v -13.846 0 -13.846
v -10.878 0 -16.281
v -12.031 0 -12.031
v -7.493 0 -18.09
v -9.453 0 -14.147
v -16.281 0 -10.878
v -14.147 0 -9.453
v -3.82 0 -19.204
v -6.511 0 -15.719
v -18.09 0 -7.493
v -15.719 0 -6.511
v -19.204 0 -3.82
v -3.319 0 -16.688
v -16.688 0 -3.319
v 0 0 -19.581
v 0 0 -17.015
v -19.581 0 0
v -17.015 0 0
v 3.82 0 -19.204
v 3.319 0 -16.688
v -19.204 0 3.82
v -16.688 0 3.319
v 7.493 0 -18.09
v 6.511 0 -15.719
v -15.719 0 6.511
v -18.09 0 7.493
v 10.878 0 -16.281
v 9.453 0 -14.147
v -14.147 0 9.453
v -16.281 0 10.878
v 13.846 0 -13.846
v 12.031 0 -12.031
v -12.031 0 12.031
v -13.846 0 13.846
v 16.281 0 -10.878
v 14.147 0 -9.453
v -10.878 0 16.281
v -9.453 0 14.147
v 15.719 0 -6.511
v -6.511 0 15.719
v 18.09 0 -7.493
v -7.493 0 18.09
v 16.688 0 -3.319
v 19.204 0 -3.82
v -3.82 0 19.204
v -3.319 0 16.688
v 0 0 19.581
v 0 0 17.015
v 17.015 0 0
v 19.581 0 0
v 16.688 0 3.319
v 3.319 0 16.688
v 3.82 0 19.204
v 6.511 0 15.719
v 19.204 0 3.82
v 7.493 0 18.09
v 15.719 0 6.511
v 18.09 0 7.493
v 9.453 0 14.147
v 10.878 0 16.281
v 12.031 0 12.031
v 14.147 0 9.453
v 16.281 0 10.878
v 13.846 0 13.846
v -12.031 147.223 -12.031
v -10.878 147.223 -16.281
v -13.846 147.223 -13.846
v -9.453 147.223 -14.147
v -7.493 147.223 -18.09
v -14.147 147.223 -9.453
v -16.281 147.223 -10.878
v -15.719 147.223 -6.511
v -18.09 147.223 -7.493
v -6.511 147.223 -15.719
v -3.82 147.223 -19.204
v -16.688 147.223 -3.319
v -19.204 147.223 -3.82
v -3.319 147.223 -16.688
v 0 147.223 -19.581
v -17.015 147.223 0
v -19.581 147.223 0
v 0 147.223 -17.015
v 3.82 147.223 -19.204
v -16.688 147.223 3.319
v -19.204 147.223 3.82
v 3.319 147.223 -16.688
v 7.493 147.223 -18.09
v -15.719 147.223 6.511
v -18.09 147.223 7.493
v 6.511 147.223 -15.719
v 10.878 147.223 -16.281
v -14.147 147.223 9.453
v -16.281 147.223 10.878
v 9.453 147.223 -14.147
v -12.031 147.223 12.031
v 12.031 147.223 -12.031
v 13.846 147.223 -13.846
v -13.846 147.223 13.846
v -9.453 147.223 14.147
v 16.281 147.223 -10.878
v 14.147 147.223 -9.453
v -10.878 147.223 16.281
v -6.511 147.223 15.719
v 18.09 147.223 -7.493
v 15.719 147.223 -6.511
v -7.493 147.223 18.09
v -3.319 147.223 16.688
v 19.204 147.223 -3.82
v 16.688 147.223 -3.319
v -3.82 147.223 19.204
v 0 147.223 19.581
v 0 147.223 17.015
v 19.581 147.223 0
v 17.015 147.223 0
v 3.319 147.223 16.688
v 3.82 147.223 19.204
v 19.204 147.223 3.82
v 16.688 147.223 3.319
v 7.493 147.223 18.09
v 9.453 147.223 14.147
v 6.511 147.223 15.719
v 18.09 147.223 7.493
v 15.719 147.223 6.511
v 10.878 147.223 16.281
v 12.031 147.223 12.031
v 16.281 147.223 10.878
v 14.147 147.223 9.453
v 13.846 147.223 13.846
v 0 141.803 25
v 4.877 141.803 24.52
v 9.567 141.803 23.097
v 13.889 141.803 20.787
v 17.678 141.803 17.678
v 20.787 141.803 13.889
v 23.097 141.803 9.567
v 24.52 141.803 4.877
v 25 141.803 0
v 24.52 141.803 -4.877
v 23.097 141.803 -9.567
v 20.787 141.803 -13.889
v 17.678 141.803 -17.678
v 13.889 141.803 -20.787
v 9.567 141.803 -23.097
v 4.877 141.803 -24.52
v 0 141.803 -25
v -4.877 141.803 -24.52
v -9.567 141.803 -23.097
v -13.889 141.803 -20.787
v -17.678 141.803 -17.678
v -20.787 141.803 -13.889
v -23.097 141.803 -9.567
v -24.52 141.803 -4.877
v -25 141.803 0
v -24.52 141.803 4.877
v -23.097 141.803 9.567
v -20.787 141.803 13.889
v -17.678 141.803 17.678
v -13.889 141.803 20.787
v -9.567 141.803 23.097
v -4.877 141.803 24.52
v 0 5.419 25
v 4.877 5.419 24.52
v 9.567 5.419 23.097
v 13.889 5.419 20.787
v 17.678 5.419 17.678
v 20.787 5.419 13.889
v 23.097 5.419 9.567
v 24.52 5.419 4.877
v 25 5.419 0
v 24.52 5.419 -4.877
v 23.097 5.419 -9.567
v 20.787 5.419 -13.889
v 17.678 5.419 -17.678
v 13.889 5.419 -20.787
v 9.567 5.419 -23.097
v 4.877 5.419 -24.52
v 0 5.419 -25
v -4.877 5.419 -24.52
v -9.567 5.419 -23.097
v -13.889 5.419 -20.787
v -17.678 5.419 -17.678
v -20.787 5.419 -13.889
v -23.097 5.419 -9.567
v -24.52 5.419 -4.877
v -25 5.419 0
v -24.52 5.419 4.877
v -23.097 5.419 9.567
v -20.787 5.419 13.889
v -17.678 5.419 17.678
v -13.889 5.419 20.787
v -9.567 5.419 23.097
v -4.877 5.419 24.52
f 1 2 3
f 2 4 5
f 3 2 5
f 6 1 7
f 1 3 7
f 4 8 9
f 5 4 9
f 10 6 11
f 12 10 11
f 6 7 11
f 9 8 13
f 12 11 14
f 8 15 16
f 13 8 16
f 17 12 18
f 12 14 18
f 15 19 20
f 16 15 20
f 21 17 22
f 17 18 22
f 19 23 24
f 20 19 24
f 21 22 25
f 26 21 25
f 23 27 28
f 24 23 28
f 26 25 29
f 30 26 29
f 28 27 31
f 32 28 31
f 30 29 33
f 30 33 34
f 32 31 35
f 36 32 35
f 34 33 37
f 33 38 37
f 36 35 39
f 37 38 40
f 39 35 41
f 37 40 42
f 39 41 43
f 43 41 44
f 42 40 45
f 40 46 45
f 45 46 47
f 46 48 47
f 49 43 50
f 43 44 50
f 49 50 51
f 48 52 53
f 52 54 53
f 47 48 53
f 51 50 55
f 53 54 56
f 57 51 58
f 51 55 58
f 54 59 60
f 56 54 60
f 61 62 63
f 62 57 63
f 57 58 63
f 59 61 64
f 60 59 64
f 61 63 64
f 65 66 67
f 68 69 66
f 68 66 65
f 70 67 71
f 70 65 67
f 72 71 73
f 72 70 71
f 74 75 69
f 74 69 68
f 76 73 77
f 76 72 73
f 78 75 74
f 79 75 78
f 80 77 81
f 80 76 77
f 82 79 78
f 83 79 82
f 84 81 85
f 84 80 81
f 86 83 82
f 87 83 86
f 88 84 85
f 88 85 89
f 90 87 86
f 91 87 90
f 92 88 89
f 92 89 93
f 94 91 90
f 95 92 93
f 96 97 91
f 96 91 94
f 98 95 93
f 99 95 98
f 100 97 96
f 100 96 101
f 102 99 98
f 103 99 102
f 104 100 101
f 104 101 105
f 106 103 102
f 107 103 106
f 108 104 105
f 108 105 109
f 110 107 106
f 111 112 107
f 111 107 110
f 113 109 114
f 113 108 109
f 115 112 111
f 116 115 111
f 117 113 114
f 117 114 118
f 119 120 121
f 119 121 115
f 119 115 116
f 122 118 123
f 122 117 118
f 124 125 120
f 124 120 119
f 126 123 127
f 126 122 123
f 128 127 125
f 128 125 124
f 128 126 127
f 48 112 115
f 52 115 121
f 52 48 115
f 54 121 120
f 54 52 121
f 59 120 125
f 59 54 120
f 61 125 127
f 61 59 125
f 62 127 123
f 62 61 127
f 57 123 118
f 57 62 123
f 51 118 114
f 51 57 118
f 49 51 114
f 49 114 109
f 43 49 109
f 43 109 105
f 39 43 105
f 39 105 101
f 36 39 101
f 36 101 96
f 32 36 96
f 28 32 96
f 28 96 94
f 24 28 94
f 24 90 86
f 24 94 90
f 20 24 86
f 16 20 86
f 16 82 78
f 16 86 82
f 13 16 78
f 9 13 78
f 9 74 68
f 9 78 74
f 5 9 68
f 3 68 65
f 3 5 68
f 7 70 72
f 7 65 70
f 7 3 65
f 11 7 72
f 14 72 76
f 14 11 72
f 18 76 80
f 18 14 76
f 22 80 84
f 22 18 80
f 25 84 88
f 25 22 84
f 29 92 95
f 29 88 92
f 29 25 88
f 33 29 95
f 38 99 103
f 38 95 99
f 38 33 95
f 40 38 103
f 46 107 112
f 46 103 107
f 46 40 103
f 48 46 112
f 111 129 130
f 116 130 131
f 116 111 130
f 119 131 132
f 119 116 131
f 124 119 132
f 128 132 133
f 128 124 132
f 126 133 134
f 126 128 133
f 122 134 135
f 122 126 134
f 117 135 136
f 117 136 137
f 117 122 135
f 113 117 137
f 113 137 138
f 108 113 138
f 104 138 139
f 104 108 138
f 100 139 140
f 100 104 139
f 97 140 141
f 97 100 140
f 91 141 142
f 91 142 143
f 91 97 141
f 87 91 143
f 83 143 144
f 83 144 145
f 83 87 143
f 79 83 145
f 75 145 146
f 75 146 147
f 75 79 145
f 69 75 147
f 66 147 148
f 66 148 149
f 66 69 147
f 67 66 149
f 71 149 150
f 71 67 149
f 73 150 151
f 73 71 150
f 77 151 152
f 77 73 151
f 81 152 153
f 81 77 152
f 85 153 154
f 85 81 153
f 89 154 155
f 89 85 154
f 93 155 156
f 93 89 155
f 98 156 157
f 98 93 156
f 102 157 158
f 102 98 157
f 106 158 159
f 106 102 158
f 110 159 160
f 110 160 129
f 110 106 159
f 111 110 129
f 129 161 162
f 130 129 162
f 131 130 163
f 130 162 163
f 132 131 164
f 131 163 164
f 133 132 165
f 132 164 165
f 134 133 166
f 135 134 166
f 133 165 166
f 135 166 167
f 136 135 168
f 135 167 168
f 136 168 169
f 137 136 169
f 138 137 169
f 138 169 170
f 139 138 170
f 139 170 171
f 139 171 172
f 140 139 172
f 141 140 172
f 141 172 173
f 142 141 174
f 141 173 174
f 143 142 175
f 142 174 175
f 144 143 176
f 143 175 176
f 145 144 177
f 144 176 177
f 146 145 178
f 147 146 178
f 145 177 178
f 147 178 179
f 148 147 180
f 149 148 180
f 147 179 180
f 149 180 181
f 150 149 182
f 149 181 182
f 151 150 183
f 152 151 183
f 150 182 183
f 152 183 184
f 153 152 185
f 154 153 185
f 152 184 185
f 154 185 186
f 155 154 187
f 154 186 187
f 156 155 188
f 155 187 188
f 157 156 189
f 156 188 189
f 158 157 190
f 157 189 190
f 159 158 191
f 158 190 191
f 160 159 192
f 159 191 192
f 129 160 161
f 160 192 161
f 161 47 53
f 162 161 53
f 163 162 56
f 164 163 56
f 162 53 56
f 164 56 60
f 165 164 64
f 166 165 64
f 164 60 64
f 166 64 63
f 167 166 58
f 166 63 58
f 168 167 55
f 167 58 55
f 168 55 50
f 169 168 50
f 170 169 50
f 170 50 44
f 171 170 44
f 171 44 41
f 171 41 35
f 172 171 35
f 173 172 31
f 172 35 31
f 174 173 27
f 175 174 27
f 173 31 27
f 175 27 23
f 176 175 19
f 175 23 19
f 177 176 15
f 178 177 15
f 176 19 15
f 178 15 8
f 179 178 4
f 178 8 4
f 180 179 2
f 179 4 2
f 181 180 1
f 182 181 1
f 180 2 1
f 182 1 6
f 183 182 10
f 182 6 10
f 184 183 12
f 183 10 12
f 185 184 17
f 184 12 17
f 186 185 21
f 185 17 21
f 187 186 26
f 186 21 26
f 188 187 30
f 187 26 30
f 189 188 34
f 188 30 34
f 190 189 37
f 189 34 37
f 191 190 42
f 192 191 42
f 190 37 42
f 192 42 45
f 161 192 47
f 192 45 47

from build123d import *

# Parameters (mm, degrees)
SKETCH1_R           = 25
BOSS_EXTRUDE1_DEPTH = 147.222688113
SKETCH2_R           = 17.014514558
CUT_EXTRUDE1_DEPTH  = 152.408453843
CHAMFER1_SIZE       = 5.419405074


with BuildPart() as part:
    # Sketch1 → Boss-Extrude1 (new body)
    with BuildSketch(Plane(origin=(0, 0, 0), x_dir=(1, 0, 0), z_dir=(0, 1, 0))):
        Circle(SKETCH1_R)
    extrude(amount=BOSS_EXTRUDE1_DEPTH)

    # Sketch2 → Cut-Extrude1 (cut, through all)
    with BuildSketch(Plane(origin=(0, 0, 0), x_dir=(1, 0, 0), z_dir=(0, 1, 0))):
        Circle(SKETCH2_R)
    extrude(amount=CUT_EXTRUDE1_DEPTH, mode=Mode.SUBTRACT)

    # Chamfer1
    chamfer1_edges = [part.edges().sort_by_distance(p)[0] for p in [
        (-25, 147.222688113, 0),
        (-25, 0, 0),
    ]]
    chamfer(chamfer1_edges, length=CHAMFER1_SIZE)


solid = part.part
